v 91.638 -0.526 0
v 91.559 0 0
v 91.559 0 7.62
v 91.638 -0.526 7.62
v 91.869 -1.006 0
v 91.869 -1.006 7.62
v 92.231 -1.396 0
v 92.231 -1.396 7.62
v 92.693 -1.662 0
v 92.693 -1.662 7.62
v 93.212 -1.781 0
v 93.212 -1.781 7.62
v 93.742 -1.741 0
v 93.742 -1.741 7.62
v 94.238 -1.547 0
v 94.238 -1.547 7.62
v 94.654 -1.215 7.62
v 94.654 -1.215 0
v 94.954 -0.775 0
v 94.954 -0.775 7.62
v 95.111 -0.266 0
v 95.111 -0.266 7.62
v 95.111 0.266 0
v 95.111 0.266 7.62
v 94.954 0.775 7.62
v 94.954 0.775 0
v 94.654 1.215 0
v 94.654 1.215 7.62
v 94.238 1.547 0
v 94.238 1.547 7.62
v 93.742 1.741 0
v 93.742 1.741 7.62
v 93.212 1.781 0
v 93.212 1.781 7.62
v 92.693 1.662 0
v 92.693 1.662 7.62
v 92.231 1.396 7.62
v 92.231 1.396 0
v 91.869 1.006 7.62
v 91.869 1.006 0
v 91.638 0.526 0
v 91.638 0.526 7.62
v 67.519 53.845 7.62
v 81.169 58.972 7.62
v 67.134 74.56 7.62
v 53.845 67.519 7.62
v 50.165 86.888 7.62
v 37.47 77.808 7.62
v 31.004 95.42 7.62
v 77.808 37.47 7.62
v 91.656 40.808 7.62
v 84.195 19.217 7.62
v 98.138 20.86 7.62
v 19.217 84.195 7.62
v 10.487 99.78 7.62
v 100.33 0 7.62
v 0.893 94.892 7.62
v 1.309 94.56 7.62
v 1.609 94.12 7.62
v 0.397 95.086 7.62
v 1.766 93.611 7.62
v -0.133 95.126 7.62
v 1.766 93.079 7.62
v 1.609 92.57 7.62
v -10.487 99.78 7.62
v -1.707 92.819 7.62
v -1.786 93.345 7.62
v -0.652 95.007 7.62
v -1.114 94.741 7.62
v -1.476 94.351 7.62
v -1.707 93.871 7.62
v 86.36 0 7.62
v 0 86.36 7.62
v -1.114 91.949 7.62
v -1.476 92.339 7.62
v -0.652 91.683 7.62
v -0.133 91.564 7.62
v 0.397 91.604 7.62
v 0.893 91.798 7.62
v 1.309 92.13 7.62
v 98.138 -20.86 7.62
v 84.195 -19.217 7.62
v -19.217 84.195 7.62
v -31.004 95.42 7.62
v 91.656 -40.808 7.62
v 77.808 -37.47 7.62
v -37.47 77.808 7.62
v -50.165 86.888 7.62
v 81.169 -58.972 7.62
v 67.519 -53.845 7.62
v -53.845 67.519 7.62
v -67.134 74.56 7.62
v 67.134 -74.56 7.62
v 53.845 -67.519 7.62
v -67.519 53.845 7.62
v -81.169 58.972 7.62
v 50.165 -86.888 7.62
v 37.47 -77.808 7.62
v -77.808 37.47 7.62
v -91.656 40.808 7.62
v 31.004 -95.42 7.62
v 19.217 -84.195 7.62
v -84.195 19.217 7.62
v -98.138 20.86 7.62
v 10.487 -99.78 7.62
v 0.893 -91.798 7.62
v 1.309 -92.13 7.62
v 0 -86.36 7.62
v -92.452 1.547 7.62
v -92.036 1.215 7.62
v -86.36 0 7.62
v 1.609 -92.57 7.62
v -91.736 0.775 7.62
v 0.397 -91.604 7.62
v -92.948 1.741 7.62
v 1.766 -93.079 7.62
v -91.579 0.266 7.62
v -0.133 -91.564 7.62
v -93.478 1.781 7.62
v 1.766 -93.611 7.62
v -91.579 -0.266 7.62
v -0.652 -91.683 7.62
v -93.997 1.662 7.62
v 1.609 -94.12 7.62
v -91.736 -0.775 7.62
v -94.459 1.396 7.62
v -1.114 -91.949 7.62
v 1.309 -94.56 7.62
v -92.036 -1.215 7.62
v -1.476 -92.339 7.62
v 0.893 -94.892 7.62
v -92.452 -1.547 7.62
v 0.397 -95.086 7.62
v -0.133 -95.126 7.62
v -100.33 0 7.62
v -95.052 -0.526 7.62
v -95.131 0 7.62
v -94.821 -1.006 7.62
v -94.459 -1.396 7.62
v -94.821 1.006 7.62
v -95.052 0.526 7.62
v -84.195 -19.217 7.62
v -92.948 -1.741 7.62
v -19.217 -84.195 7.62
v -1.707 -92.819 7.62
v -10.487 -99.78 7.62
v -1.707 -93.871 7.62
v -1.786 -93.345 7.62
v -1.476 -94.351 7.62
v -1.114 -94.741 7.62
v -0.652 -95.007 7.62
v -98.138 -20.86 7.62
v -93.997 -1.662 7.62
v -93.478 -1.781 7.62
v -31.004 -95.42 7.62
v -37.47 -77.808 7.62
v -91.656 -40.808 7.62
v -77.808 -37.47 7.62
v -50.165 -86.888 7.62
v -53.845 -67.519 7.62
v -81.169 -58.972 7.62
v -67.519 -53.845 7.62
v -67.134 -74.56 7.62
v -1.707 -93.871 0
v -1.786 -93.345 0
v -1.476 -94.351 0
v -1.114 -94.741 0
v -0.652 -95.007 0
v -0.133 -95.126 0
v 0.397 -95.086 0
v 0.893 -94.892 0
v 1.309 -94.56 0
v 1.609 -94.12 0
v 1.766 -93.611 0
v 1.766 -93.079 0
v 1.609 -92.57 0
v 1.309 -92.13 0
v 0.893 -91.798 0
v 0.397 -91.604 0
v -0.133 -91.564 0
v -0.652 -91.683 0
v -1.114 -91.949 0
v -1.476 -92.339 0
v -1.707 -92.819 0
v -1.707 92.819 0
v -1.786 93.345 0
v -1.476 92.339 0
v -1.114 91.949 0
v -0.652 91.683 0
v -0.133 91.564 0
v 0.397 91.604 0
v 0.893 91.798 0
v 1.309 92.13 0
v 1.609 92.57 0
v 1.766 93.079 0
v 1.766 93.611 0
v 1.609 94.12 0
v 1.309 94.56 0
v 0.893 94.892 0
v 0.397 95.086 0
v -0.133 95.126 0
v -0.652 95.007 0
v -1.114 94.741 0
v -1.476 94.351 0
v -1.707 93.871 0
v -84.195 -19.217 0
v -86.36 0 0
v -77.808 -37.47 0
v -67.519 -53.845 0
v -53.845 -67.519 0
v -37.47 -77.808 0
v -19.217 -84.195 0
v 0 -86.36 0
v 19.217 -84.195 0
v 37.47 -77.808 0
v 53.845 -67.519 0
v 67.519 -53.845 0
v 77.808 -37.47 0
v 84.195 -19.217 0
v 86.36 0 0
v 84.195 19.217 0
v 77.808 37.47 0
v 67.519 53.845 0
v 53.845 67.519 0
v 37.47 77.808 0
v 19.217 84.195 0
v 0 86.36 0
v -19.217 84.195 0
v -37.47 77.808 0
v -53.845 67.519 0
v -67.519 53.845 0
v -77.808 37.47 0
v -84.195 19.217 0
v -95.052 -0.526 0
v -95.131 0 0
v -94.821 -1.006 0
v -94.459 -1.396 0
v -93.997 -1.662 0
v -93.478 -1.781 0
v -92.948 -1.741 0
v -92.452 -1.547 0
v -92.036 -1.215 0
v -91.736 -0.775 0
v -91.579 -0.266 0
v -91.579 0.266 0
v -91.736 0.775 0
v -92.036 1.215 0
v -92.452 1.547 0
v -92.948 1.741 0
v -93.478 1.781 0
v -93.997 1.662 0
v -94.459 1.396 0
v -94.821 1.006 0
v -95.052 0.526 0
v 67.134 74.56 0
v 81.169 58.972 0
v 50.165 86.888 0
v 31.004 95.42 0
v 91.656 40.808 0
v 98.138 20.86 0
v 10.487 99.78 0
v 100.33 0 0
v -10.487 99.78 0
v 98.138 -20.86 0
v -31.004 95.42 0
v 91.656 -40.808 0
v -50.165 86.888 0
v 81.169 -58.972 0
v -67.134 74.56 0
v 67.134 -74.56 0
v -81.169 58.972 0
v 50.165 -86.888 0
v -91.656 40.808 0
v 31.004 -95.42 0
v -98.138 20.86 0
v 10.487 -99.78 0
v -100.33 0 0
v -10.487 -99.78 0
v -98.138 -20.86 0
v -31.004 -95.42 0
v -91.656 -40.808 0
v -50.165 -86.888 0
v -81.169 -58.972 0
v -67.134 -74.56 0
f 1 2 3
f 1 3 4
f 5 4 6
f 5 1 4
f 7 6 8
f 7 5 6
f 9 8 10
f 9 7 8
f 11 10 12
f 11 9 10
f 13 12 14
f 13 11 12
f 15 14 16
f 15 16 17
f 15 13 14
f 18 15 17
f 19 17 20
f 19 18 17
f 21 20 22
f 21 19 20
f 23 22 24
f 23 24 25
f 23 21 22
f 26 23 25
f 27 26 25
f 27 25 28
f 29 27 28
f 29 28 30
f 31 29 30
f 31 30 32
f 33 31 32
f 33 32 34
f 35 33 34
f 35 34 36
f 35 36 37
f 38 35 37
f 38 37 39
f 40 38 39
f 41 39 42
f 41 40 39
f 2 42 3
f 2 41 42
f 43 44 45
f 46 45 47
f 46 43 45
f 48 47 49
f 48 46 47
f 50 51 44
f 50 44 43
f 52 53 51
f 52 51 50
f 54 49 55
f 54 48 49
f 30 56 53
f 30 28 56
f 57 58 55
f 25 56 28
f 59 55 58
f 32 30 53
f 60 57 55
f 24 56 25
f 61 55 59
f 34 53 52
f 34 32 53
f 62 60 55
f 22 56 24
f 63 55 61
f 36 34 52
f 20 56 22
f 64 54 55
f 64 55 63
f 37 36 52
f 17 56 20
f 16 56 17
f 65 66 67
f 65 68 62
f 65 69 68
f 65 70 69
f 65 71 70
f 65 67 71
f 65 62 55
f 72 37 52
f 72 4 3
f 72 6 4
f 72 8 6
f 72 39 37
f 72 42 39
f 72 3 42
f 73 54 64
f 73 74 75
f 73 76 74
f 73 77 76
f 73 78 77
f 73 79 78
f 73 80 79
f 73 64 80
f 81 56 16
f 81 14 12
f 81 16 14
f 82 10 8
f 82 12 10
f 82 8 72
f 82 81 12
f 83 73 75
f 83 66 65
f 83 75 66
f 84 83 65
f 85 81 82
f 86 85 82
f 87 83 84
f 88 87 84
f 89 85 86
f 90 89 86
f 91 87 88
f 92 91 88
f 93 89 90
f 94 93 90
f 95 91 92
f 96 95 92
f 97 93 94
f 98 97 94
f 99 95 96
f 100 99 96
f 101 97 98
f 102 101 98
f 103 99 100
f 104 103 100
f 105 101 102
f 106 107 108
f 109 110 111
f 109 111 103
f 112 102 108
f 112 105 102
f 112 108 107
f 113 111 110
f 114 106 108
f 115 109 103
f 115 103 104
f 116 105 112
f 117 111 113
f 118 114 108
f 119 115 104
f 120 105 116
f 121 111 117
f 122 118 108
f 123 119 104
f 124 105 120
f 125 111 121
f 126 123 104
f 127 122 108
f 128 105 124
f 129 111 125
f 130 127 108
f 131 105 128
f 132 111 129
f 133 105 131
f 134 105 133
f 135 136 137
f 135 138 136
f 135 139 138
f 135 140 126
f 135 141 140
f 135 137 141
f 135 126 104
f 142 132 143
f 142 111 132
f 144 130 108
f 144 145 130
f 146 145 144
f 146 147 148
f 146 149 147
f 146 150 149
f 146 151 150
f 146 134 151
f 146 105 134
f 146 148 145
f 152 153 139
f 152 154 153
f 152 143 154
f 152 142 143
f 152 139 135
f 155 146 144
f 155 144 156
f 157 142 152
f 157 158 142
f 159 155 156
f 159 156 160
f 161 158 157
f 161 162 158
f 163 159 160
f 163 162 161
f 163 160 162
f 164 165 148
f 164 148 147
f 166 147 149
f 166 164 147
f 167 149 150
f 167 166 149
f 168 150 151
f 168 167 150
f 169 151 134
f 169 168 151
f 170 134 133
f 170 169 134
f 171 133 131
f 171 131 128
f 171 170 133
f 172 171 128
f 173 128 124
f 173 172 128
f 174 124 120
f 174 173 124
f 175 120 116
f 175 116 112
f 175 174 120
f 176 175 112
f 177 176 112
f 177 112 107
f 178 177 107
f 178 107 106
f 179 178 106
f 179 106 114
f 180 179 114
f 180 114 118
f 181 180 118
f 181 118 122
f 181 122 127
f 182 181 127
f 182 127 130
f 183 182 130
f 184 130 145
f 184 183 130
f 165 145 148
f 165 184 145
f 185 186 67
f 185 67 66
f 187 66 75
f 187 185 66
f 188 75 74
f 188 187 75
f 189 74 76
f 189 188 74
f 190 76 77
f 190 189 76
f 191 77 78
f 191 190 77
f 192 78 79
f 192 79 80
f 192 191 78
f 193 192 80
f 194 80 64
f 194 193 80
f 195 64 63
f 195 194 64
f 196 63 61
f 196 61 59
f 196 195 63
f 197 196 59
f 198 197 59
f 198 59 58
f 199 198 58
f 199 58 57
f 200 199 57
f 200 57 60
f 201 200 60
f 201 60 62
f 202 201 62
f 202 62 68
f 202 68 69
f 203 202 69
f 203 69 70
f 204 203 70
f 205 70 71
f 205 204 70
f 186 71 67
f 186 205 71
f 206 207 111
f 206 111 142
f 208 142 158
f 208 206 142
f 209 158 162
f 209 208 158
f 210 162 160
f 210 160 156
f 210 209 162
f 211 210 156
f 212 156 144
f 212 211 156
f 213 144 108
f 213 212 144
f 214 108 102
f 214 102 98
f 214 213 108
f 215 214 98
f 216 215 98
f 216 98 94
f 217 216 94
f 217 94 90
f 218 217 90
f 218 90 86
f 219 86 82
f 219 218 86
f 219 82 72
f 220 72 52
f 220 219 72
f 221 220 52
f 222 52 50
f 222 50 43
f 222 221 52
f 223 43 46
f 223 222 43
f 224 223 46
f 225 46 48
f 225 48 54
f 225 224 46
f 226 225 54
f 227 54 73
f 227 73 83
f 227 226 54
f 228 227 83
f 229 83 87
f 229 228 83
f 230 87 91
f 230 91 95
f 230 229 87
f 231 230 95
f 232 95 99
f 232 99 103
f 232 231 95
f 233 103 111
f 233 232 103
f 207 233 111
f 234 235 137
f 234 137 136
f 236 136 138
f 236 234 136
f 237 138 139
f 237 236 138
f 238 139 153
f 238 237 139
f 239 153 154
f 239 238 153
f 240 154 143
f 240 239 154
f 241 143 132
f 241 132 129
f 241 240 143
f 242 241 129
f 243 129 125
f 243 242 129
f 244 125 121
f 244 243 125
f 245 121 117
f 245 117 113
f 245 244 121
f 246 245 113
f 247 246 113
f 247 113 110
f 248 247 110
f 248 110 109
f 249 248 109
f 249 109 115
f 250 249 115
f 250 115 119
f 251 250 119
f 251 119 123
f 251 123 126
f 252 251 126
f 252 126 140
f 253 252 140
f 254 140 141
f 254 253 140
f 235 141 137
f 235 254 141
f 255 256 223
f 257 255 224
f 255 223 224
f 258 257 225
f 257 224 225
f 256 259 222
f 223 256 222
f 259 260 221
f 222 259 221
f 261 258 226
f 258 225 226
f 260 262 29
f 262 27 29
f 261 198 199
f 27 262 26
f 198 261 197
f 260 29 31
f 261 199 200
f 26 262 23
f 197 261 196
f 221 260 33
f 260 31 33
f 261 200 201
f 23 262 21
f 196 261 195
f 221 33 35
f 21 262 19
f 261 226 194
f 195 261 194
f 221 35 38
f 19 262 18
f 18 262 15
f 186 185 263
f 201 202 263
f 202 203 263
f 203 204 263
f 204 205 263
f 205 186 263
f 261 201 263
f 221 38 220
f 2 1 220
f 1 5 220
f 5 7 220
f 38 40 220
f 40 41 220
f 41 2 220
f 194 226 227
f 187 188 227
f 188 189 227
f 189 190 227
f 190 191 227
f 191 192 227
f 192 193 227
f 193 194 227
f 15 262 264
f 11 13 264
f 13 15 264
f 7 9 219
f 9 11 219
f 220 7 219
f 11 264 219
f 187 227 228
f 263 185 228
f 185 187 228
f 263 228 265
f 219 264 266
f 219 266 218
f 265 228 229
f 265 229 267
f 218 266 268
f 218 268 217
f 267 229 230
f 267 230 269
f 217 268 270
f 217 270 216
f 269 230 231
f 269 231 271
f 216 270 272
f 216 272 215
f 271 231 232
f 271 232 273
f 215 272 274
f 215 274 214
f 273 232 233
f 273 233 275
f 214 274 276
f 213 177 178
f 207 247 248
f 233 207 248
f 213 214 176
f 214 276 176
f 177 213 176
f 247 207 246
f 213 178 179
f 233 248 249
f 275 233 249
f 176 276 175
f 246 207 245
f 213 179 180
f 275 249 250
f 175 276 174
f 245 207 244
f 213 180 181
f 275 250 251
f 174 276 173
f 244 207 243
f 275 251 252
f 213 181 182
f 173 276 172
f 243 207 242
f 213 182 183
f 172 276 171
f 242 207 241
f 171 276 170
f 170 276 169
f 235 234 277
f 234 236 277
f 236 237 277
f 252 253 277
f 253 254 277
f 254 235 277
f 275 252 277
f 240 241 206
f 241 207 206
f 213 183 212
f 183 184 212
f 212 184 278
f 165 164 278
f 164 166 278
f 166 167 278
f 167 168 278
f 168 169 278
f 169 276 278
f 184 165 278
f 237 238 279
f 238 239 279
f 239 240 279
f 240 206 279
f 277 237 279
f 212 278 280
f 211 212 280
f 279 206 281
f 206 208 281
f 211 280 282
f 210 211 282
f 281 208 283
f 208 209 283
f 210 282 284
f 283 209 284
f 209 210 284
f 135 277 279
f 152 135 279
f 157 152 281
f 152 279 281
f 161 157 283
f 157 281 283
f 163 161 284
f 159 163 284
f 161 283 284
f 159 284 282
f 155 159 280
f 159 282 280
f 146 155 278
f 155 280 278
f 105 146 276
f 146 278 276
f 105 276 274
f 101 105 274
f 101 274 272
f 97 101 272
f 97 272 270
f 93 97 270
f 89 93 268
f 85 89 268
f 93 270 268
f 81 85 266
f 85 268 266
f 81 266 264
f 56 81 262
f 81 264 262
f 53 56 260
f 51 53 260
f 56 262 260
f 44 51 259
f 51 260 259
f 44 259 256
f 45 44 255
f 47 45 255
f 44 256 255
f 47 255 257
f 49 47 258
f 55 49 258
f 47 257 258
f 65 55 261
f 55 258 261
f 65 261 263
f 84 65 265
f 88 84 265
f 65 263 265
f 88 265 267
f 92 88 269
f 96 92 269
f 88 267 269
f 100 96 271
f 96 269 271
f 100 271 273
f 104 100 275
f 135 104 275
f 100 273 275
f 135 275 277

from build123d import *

# Parameters (mm, degrees)
SKETCH1_R           = 100.33
SKETCH1_R_2         = 86.36
SKETCH1_R_3         = 1.7859375
BOSS_EXTRUDE1_DEPTH = 7.62


with BuildPart() as part:
    # Sketch1 → Boss-Extrude1 (new body)
    with BuildSketch(Plane.XY):
        with Locations(Location((0, 0, 0), (0, 0, 180))):
            Circle(SKETCH1_R)
        with Locations(Location((0, 0, 0), (0, 0, 180))):
            Circle(SKETCH1_R_2, mode=Mode.SUBTRACT)
        with Locations(Location((0, 93.345, 0), (0, 0, 180))):
            Circle(SKETCH1_R_3, mode=Mode.SUBTRACT)
        with Locations(Location((93.345, 0, 0), (0, 0, 180))):
            Circle(SKETCH1_R_3, mode=Mode.SUBTRACT)
        with Locations(Location((0, -93.345, 0), (0, 0, 180))):
            Circle(SKETCH1_R_3, mode=Mode.SUBTRACT)
        with Locations(Location((-93.345, 0, 0), (0, 0, 180))):
            Circle(SKETCH1_R_3, mode=Mode.SUBTRACT)
    extrude(amount=BOSS_EXTRUDE1_DEPTH)


solid = part.part
